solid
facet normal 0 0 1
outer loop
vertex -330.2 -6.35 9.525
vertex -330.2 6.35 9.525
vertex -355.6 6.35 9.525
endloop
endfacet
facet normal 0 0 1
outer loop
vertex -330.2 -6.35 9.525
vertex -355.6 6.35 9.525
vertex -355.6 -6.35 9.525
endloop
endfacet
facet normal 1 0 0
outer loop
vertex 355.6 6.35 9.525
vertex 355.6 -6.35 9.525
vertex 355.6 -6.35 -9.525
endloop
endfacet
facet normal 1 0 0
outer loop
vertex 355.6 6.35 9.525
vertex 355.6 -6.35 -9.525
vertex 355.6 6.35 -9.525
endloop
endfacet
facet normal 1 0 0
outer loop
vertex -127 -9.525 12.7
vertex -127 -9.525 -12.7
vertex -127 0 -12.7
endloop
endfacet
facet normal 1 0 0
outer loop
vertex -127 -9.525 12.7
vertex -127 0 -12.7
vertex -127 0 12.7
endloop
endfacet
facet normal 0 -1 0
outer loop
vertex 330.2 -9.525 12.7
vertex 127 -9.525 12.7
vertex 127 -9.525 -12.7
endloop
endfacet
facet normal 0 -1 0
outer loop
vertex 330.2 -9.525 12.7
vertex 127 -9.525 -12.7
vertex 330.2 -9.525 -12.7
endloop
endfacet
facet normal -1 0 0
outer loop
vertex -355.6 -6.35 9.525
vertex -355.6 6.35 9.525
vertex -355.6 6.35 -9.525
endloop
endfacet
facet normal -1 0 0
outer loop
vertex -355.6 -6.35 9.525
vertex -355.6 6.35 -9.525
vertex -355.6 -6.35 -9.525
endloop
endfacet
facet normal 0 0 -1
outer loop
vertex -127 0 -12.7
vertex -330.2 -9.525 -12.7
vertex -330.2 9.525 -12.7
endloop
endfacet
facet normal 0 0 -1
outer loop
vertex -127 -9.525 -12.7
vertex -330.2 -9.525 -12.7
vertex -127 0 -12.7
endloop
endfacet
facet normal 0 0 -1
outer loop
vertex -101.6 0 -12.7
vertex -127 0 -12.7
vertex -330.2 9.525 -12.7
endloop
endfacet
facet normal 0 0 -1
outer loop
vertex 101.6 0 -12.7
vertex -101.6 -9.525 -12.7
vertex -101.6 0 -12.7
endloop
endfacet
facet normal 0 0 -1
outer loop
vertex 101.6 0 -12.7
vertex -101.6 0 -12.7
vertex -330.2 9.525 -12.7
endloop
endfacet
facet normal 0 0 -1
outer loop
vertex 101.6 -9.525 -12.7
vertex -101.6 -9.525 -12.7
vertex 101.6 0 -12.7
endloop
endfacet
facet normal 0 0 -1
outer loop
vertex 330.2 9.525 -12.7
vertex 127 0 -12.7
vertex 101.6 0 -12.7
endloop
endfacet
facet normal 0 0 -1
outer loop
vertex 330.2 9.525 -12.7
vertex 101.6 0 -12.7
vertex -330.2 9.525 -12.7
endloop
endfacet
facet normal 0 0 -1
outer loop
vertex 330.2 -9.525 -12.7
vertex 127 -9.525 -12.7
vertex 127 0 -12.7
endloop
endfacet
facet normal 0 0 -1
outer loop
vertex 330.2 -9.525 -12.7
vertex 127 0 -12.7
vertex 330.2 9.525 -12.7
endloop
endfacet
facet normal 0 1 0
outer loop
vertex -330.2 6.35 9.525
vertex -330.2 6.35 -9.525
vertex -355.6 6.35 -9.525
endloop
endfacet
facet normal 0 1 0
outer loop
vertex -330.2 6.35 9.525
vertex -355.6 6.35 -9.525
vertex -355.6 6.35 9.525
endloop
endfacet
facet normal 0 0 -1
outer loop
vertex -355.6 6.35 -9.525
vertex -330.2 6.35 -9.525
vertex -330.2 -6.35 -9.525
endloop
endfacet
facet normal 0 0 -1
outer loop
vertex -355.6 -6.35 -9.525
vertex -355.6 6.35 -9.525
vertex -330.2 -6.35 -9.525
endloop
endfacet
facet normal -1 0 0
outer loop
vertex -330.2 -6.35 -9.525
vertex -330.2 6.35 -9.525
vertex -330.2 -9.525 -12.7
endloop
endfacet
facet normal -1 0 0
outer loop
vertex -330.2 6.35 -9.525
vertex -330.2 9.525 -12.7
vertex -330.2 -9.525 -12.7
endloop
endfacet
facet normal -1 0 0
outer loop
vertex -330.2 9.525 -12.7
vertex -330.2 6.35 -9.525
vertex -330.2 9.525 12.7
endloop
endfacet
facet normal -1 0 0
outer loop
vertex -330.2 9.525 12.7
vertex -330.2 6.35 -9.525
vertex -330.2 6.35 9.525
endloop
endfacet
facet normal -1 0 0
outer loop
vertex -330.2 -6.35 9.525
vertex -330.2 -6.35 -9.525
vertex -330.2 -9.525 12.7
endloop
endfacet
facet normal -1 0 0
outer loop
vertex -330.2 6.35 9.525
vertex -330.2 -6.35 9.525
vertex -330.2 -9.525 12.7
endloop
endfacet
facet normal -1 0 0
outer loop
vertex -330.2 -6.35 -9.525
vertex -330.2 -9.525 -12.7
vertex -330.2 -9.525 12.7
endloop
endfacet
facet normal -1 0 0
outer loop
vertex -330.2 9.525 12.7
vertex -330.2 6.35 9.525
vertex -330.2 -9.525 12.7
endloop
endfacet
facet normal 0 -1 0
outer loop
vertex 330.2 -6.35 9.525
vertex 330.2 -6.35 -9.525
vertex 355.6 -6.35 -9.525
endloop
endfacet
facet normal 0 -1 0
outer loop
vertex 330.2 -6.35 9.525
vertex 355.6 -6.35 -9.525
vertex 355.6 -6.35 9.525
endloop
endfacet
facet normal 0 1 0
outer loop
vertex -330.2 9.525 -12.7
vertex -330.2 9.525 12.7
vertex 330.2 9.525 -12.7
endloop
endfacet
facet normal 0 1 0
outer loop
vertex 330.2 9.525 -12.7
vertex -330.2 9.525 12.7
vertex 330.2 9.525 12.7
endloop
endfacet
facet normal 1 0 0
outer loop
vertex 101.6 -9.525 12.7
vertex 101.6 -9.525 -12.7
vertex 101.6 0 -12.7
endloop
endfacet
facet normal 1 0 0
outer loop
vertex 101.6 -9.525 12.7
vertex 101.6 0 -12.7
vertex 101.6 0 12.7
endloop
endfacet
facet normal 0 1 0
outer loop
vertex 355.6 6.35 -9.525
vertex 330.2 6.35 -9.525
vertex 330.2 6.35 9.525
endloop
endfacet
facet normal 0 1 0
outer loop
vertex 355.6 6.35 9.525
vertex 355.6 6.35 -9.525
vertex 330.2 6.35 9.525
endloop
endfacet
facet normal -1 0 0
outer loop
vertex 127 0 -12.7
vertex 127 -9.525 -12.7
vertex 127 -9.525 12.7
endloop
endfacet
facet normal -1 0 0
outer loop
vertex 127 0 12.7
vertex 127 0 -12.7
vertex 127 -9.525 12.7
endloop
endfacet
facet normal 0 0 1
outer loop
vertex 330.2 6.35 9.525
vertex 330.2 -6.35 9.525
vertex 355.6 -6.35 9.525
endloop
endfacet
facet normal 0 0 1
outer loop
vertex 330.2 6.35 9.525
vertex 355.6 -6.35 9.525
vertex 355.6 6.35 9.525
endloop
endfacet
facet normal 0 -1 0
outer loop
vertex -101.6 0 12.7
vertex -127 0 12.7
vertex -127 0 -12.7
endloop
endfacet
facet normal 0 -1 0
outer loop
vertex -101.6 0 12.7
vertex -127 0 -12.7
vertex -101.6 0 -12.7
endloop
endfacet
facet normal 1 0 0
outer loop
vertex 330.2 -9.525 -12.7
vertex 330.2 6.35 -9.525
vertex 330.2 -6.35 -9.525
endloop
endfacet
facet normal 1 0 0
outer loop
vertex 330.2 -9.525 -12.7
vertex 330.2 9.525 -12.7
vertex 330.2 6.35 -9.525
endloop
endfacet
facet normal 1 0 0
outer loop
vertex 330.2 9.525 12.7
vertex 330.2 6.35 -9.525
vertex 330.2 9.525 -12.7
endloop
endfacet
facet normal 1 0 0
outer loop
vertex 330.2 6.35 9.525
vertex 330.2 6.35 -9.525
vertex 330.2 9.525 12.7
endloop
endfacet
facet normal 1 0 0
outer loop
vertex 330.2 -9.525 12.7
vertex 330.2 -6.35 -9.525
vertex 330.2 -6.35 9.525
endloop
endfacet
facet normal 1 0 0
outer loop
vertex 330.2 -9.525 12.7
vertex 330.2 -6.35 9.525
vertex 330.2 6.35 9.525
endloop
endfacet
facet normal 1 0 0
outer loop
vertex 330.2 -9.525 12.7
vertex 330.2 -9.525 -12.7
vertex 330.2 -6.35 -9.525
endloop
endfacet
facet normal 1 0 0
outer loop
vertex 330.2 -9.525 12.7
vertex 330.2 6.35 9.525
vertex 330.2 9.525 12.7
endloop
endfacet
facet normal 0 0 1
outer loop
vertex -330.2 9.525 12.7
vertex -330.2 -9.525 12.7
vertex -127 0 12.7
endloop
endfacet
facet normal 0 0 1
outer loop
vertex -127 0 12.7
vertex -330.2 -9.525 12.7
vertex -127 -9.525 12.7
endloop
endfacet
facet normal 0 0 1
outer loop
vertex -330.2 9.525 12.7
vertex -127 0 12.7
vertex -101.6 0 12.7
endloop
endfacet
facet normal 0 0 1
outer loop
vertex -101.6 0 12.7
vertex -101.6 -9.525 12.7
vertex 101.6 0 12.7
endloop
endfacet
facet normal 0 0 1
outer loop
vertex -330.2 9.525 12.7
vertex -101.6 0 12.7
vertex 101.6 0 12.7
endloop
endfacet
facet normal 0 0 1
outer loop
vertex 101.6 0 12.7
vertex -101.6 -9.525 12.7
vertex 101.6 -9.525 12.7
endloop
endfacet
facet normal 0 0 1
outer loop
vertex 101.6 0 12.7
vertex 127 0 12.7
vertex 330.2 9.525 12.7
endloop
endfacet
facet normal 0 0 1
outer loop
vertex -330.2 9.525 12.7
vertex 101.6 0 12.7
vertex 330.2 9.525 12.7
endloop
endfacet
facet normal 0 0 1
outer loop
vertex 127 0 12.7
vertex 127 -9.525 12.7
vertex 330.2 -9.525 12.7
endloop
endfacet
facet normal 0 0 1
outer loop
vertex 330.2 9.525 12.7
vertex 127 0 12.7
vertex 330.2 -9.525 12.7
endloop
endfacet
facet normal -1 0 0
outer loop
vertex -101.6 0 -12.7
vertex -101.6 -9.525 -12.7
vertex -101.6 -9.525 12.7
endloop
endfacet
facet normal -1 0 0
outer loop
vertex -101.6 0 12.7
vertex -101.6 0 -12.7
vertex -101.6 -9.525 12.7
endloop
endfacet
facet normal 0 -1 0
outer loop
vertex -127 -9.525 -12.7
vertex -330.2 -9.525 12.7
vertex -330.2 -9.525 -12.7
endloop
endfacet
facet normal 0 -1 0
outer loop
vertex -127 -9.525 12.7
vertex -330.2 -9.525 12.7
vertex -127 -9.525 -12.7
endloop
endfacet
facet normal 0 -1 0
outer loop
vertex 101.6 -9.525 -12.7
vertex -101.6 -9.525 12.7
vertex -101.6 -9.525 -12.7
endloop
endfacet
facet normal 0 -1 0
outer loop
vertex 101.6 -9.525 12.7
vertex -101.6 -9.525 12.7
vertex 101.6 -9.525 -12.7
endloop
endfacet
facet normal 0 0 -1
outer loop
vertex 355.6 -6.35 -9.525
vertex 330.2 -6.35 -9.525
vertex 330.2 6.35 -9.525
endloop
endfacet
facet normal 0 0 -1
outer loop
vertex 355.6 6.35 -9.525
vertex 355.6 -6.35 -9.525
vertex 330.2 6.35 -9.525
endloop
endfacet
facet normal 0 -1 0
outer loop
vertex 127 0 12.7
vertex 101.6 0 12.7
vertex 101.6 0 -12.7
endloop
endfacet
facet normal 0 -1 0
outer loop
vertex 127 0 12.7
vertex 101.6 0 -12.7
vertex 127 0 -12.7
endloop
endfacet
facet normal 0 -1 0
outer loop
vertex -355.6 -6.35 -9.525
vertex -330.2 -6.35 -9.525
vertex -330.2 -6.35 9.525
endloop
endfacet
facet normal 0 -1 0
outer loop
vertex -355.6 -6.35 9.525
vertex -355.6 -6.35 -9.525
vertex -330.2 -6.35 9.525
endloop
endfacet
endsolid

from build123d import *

# Parameters (mm, degrees)
F0_W     = 660.4
F0_H     = 25.4
F1_DEPTH = 9.525
F2_W     = 25.4
F2_H     = 25.4
F3_DEPTH = 9.525
F4_DEPTH = 9.525
F5_W     = 12.7
F5_H     = 19.05
F7_DEPTH = 25.4
F6_W     = 12.7
F6_H     = 19.05
F8_DEPTH = 25.4


with BuildPart() as f1:
    # F0 (on Front) → F1 (new body, symmetric)
    with BuildSketch(Plane.XZ):
        Rectangle(F0_W, F0_H)
    extrude(amount=F1_DEPTH, both=True)

    # F2 (on face) → F3 (cut)
    with BuildSketch(Plane.XZ.offset(9.525)):
        with Locations((-114.3, 0)):
            Rectangle(F2_W, F2_H)
    extrude(amount=-F3_DEPTH, mode=Mode.SUBTRACT)

    # F2 (on face) → F4 (cut)
    with BuildSketch(Plane.XZ.offset(9.525)):
        with Locations((114.3, 0)):
            Rectangle(F2_W, F2_H)
    extrude(amount=-F4_DEPTH, mode=Mode.SUBTRACT)

    # F5 (on face) → F7 (join)
    with BuildSketch(Plane(origin=(-330.2, 0, 0), x_dir=(0, -1, 0), z_dir=(-1, 0, 0))):
        Rectangle(F5_W, F5_H)
    extrude(amount=F7_DEPTH)

    # F6 (on face) → F8 (join)
    with BuildSketch(Plane.YZ.offset(330.2)):
        Rectangle(F6_W, F6_H)
    extrude(amount=F8_DEPTH)


solid = f1.part
